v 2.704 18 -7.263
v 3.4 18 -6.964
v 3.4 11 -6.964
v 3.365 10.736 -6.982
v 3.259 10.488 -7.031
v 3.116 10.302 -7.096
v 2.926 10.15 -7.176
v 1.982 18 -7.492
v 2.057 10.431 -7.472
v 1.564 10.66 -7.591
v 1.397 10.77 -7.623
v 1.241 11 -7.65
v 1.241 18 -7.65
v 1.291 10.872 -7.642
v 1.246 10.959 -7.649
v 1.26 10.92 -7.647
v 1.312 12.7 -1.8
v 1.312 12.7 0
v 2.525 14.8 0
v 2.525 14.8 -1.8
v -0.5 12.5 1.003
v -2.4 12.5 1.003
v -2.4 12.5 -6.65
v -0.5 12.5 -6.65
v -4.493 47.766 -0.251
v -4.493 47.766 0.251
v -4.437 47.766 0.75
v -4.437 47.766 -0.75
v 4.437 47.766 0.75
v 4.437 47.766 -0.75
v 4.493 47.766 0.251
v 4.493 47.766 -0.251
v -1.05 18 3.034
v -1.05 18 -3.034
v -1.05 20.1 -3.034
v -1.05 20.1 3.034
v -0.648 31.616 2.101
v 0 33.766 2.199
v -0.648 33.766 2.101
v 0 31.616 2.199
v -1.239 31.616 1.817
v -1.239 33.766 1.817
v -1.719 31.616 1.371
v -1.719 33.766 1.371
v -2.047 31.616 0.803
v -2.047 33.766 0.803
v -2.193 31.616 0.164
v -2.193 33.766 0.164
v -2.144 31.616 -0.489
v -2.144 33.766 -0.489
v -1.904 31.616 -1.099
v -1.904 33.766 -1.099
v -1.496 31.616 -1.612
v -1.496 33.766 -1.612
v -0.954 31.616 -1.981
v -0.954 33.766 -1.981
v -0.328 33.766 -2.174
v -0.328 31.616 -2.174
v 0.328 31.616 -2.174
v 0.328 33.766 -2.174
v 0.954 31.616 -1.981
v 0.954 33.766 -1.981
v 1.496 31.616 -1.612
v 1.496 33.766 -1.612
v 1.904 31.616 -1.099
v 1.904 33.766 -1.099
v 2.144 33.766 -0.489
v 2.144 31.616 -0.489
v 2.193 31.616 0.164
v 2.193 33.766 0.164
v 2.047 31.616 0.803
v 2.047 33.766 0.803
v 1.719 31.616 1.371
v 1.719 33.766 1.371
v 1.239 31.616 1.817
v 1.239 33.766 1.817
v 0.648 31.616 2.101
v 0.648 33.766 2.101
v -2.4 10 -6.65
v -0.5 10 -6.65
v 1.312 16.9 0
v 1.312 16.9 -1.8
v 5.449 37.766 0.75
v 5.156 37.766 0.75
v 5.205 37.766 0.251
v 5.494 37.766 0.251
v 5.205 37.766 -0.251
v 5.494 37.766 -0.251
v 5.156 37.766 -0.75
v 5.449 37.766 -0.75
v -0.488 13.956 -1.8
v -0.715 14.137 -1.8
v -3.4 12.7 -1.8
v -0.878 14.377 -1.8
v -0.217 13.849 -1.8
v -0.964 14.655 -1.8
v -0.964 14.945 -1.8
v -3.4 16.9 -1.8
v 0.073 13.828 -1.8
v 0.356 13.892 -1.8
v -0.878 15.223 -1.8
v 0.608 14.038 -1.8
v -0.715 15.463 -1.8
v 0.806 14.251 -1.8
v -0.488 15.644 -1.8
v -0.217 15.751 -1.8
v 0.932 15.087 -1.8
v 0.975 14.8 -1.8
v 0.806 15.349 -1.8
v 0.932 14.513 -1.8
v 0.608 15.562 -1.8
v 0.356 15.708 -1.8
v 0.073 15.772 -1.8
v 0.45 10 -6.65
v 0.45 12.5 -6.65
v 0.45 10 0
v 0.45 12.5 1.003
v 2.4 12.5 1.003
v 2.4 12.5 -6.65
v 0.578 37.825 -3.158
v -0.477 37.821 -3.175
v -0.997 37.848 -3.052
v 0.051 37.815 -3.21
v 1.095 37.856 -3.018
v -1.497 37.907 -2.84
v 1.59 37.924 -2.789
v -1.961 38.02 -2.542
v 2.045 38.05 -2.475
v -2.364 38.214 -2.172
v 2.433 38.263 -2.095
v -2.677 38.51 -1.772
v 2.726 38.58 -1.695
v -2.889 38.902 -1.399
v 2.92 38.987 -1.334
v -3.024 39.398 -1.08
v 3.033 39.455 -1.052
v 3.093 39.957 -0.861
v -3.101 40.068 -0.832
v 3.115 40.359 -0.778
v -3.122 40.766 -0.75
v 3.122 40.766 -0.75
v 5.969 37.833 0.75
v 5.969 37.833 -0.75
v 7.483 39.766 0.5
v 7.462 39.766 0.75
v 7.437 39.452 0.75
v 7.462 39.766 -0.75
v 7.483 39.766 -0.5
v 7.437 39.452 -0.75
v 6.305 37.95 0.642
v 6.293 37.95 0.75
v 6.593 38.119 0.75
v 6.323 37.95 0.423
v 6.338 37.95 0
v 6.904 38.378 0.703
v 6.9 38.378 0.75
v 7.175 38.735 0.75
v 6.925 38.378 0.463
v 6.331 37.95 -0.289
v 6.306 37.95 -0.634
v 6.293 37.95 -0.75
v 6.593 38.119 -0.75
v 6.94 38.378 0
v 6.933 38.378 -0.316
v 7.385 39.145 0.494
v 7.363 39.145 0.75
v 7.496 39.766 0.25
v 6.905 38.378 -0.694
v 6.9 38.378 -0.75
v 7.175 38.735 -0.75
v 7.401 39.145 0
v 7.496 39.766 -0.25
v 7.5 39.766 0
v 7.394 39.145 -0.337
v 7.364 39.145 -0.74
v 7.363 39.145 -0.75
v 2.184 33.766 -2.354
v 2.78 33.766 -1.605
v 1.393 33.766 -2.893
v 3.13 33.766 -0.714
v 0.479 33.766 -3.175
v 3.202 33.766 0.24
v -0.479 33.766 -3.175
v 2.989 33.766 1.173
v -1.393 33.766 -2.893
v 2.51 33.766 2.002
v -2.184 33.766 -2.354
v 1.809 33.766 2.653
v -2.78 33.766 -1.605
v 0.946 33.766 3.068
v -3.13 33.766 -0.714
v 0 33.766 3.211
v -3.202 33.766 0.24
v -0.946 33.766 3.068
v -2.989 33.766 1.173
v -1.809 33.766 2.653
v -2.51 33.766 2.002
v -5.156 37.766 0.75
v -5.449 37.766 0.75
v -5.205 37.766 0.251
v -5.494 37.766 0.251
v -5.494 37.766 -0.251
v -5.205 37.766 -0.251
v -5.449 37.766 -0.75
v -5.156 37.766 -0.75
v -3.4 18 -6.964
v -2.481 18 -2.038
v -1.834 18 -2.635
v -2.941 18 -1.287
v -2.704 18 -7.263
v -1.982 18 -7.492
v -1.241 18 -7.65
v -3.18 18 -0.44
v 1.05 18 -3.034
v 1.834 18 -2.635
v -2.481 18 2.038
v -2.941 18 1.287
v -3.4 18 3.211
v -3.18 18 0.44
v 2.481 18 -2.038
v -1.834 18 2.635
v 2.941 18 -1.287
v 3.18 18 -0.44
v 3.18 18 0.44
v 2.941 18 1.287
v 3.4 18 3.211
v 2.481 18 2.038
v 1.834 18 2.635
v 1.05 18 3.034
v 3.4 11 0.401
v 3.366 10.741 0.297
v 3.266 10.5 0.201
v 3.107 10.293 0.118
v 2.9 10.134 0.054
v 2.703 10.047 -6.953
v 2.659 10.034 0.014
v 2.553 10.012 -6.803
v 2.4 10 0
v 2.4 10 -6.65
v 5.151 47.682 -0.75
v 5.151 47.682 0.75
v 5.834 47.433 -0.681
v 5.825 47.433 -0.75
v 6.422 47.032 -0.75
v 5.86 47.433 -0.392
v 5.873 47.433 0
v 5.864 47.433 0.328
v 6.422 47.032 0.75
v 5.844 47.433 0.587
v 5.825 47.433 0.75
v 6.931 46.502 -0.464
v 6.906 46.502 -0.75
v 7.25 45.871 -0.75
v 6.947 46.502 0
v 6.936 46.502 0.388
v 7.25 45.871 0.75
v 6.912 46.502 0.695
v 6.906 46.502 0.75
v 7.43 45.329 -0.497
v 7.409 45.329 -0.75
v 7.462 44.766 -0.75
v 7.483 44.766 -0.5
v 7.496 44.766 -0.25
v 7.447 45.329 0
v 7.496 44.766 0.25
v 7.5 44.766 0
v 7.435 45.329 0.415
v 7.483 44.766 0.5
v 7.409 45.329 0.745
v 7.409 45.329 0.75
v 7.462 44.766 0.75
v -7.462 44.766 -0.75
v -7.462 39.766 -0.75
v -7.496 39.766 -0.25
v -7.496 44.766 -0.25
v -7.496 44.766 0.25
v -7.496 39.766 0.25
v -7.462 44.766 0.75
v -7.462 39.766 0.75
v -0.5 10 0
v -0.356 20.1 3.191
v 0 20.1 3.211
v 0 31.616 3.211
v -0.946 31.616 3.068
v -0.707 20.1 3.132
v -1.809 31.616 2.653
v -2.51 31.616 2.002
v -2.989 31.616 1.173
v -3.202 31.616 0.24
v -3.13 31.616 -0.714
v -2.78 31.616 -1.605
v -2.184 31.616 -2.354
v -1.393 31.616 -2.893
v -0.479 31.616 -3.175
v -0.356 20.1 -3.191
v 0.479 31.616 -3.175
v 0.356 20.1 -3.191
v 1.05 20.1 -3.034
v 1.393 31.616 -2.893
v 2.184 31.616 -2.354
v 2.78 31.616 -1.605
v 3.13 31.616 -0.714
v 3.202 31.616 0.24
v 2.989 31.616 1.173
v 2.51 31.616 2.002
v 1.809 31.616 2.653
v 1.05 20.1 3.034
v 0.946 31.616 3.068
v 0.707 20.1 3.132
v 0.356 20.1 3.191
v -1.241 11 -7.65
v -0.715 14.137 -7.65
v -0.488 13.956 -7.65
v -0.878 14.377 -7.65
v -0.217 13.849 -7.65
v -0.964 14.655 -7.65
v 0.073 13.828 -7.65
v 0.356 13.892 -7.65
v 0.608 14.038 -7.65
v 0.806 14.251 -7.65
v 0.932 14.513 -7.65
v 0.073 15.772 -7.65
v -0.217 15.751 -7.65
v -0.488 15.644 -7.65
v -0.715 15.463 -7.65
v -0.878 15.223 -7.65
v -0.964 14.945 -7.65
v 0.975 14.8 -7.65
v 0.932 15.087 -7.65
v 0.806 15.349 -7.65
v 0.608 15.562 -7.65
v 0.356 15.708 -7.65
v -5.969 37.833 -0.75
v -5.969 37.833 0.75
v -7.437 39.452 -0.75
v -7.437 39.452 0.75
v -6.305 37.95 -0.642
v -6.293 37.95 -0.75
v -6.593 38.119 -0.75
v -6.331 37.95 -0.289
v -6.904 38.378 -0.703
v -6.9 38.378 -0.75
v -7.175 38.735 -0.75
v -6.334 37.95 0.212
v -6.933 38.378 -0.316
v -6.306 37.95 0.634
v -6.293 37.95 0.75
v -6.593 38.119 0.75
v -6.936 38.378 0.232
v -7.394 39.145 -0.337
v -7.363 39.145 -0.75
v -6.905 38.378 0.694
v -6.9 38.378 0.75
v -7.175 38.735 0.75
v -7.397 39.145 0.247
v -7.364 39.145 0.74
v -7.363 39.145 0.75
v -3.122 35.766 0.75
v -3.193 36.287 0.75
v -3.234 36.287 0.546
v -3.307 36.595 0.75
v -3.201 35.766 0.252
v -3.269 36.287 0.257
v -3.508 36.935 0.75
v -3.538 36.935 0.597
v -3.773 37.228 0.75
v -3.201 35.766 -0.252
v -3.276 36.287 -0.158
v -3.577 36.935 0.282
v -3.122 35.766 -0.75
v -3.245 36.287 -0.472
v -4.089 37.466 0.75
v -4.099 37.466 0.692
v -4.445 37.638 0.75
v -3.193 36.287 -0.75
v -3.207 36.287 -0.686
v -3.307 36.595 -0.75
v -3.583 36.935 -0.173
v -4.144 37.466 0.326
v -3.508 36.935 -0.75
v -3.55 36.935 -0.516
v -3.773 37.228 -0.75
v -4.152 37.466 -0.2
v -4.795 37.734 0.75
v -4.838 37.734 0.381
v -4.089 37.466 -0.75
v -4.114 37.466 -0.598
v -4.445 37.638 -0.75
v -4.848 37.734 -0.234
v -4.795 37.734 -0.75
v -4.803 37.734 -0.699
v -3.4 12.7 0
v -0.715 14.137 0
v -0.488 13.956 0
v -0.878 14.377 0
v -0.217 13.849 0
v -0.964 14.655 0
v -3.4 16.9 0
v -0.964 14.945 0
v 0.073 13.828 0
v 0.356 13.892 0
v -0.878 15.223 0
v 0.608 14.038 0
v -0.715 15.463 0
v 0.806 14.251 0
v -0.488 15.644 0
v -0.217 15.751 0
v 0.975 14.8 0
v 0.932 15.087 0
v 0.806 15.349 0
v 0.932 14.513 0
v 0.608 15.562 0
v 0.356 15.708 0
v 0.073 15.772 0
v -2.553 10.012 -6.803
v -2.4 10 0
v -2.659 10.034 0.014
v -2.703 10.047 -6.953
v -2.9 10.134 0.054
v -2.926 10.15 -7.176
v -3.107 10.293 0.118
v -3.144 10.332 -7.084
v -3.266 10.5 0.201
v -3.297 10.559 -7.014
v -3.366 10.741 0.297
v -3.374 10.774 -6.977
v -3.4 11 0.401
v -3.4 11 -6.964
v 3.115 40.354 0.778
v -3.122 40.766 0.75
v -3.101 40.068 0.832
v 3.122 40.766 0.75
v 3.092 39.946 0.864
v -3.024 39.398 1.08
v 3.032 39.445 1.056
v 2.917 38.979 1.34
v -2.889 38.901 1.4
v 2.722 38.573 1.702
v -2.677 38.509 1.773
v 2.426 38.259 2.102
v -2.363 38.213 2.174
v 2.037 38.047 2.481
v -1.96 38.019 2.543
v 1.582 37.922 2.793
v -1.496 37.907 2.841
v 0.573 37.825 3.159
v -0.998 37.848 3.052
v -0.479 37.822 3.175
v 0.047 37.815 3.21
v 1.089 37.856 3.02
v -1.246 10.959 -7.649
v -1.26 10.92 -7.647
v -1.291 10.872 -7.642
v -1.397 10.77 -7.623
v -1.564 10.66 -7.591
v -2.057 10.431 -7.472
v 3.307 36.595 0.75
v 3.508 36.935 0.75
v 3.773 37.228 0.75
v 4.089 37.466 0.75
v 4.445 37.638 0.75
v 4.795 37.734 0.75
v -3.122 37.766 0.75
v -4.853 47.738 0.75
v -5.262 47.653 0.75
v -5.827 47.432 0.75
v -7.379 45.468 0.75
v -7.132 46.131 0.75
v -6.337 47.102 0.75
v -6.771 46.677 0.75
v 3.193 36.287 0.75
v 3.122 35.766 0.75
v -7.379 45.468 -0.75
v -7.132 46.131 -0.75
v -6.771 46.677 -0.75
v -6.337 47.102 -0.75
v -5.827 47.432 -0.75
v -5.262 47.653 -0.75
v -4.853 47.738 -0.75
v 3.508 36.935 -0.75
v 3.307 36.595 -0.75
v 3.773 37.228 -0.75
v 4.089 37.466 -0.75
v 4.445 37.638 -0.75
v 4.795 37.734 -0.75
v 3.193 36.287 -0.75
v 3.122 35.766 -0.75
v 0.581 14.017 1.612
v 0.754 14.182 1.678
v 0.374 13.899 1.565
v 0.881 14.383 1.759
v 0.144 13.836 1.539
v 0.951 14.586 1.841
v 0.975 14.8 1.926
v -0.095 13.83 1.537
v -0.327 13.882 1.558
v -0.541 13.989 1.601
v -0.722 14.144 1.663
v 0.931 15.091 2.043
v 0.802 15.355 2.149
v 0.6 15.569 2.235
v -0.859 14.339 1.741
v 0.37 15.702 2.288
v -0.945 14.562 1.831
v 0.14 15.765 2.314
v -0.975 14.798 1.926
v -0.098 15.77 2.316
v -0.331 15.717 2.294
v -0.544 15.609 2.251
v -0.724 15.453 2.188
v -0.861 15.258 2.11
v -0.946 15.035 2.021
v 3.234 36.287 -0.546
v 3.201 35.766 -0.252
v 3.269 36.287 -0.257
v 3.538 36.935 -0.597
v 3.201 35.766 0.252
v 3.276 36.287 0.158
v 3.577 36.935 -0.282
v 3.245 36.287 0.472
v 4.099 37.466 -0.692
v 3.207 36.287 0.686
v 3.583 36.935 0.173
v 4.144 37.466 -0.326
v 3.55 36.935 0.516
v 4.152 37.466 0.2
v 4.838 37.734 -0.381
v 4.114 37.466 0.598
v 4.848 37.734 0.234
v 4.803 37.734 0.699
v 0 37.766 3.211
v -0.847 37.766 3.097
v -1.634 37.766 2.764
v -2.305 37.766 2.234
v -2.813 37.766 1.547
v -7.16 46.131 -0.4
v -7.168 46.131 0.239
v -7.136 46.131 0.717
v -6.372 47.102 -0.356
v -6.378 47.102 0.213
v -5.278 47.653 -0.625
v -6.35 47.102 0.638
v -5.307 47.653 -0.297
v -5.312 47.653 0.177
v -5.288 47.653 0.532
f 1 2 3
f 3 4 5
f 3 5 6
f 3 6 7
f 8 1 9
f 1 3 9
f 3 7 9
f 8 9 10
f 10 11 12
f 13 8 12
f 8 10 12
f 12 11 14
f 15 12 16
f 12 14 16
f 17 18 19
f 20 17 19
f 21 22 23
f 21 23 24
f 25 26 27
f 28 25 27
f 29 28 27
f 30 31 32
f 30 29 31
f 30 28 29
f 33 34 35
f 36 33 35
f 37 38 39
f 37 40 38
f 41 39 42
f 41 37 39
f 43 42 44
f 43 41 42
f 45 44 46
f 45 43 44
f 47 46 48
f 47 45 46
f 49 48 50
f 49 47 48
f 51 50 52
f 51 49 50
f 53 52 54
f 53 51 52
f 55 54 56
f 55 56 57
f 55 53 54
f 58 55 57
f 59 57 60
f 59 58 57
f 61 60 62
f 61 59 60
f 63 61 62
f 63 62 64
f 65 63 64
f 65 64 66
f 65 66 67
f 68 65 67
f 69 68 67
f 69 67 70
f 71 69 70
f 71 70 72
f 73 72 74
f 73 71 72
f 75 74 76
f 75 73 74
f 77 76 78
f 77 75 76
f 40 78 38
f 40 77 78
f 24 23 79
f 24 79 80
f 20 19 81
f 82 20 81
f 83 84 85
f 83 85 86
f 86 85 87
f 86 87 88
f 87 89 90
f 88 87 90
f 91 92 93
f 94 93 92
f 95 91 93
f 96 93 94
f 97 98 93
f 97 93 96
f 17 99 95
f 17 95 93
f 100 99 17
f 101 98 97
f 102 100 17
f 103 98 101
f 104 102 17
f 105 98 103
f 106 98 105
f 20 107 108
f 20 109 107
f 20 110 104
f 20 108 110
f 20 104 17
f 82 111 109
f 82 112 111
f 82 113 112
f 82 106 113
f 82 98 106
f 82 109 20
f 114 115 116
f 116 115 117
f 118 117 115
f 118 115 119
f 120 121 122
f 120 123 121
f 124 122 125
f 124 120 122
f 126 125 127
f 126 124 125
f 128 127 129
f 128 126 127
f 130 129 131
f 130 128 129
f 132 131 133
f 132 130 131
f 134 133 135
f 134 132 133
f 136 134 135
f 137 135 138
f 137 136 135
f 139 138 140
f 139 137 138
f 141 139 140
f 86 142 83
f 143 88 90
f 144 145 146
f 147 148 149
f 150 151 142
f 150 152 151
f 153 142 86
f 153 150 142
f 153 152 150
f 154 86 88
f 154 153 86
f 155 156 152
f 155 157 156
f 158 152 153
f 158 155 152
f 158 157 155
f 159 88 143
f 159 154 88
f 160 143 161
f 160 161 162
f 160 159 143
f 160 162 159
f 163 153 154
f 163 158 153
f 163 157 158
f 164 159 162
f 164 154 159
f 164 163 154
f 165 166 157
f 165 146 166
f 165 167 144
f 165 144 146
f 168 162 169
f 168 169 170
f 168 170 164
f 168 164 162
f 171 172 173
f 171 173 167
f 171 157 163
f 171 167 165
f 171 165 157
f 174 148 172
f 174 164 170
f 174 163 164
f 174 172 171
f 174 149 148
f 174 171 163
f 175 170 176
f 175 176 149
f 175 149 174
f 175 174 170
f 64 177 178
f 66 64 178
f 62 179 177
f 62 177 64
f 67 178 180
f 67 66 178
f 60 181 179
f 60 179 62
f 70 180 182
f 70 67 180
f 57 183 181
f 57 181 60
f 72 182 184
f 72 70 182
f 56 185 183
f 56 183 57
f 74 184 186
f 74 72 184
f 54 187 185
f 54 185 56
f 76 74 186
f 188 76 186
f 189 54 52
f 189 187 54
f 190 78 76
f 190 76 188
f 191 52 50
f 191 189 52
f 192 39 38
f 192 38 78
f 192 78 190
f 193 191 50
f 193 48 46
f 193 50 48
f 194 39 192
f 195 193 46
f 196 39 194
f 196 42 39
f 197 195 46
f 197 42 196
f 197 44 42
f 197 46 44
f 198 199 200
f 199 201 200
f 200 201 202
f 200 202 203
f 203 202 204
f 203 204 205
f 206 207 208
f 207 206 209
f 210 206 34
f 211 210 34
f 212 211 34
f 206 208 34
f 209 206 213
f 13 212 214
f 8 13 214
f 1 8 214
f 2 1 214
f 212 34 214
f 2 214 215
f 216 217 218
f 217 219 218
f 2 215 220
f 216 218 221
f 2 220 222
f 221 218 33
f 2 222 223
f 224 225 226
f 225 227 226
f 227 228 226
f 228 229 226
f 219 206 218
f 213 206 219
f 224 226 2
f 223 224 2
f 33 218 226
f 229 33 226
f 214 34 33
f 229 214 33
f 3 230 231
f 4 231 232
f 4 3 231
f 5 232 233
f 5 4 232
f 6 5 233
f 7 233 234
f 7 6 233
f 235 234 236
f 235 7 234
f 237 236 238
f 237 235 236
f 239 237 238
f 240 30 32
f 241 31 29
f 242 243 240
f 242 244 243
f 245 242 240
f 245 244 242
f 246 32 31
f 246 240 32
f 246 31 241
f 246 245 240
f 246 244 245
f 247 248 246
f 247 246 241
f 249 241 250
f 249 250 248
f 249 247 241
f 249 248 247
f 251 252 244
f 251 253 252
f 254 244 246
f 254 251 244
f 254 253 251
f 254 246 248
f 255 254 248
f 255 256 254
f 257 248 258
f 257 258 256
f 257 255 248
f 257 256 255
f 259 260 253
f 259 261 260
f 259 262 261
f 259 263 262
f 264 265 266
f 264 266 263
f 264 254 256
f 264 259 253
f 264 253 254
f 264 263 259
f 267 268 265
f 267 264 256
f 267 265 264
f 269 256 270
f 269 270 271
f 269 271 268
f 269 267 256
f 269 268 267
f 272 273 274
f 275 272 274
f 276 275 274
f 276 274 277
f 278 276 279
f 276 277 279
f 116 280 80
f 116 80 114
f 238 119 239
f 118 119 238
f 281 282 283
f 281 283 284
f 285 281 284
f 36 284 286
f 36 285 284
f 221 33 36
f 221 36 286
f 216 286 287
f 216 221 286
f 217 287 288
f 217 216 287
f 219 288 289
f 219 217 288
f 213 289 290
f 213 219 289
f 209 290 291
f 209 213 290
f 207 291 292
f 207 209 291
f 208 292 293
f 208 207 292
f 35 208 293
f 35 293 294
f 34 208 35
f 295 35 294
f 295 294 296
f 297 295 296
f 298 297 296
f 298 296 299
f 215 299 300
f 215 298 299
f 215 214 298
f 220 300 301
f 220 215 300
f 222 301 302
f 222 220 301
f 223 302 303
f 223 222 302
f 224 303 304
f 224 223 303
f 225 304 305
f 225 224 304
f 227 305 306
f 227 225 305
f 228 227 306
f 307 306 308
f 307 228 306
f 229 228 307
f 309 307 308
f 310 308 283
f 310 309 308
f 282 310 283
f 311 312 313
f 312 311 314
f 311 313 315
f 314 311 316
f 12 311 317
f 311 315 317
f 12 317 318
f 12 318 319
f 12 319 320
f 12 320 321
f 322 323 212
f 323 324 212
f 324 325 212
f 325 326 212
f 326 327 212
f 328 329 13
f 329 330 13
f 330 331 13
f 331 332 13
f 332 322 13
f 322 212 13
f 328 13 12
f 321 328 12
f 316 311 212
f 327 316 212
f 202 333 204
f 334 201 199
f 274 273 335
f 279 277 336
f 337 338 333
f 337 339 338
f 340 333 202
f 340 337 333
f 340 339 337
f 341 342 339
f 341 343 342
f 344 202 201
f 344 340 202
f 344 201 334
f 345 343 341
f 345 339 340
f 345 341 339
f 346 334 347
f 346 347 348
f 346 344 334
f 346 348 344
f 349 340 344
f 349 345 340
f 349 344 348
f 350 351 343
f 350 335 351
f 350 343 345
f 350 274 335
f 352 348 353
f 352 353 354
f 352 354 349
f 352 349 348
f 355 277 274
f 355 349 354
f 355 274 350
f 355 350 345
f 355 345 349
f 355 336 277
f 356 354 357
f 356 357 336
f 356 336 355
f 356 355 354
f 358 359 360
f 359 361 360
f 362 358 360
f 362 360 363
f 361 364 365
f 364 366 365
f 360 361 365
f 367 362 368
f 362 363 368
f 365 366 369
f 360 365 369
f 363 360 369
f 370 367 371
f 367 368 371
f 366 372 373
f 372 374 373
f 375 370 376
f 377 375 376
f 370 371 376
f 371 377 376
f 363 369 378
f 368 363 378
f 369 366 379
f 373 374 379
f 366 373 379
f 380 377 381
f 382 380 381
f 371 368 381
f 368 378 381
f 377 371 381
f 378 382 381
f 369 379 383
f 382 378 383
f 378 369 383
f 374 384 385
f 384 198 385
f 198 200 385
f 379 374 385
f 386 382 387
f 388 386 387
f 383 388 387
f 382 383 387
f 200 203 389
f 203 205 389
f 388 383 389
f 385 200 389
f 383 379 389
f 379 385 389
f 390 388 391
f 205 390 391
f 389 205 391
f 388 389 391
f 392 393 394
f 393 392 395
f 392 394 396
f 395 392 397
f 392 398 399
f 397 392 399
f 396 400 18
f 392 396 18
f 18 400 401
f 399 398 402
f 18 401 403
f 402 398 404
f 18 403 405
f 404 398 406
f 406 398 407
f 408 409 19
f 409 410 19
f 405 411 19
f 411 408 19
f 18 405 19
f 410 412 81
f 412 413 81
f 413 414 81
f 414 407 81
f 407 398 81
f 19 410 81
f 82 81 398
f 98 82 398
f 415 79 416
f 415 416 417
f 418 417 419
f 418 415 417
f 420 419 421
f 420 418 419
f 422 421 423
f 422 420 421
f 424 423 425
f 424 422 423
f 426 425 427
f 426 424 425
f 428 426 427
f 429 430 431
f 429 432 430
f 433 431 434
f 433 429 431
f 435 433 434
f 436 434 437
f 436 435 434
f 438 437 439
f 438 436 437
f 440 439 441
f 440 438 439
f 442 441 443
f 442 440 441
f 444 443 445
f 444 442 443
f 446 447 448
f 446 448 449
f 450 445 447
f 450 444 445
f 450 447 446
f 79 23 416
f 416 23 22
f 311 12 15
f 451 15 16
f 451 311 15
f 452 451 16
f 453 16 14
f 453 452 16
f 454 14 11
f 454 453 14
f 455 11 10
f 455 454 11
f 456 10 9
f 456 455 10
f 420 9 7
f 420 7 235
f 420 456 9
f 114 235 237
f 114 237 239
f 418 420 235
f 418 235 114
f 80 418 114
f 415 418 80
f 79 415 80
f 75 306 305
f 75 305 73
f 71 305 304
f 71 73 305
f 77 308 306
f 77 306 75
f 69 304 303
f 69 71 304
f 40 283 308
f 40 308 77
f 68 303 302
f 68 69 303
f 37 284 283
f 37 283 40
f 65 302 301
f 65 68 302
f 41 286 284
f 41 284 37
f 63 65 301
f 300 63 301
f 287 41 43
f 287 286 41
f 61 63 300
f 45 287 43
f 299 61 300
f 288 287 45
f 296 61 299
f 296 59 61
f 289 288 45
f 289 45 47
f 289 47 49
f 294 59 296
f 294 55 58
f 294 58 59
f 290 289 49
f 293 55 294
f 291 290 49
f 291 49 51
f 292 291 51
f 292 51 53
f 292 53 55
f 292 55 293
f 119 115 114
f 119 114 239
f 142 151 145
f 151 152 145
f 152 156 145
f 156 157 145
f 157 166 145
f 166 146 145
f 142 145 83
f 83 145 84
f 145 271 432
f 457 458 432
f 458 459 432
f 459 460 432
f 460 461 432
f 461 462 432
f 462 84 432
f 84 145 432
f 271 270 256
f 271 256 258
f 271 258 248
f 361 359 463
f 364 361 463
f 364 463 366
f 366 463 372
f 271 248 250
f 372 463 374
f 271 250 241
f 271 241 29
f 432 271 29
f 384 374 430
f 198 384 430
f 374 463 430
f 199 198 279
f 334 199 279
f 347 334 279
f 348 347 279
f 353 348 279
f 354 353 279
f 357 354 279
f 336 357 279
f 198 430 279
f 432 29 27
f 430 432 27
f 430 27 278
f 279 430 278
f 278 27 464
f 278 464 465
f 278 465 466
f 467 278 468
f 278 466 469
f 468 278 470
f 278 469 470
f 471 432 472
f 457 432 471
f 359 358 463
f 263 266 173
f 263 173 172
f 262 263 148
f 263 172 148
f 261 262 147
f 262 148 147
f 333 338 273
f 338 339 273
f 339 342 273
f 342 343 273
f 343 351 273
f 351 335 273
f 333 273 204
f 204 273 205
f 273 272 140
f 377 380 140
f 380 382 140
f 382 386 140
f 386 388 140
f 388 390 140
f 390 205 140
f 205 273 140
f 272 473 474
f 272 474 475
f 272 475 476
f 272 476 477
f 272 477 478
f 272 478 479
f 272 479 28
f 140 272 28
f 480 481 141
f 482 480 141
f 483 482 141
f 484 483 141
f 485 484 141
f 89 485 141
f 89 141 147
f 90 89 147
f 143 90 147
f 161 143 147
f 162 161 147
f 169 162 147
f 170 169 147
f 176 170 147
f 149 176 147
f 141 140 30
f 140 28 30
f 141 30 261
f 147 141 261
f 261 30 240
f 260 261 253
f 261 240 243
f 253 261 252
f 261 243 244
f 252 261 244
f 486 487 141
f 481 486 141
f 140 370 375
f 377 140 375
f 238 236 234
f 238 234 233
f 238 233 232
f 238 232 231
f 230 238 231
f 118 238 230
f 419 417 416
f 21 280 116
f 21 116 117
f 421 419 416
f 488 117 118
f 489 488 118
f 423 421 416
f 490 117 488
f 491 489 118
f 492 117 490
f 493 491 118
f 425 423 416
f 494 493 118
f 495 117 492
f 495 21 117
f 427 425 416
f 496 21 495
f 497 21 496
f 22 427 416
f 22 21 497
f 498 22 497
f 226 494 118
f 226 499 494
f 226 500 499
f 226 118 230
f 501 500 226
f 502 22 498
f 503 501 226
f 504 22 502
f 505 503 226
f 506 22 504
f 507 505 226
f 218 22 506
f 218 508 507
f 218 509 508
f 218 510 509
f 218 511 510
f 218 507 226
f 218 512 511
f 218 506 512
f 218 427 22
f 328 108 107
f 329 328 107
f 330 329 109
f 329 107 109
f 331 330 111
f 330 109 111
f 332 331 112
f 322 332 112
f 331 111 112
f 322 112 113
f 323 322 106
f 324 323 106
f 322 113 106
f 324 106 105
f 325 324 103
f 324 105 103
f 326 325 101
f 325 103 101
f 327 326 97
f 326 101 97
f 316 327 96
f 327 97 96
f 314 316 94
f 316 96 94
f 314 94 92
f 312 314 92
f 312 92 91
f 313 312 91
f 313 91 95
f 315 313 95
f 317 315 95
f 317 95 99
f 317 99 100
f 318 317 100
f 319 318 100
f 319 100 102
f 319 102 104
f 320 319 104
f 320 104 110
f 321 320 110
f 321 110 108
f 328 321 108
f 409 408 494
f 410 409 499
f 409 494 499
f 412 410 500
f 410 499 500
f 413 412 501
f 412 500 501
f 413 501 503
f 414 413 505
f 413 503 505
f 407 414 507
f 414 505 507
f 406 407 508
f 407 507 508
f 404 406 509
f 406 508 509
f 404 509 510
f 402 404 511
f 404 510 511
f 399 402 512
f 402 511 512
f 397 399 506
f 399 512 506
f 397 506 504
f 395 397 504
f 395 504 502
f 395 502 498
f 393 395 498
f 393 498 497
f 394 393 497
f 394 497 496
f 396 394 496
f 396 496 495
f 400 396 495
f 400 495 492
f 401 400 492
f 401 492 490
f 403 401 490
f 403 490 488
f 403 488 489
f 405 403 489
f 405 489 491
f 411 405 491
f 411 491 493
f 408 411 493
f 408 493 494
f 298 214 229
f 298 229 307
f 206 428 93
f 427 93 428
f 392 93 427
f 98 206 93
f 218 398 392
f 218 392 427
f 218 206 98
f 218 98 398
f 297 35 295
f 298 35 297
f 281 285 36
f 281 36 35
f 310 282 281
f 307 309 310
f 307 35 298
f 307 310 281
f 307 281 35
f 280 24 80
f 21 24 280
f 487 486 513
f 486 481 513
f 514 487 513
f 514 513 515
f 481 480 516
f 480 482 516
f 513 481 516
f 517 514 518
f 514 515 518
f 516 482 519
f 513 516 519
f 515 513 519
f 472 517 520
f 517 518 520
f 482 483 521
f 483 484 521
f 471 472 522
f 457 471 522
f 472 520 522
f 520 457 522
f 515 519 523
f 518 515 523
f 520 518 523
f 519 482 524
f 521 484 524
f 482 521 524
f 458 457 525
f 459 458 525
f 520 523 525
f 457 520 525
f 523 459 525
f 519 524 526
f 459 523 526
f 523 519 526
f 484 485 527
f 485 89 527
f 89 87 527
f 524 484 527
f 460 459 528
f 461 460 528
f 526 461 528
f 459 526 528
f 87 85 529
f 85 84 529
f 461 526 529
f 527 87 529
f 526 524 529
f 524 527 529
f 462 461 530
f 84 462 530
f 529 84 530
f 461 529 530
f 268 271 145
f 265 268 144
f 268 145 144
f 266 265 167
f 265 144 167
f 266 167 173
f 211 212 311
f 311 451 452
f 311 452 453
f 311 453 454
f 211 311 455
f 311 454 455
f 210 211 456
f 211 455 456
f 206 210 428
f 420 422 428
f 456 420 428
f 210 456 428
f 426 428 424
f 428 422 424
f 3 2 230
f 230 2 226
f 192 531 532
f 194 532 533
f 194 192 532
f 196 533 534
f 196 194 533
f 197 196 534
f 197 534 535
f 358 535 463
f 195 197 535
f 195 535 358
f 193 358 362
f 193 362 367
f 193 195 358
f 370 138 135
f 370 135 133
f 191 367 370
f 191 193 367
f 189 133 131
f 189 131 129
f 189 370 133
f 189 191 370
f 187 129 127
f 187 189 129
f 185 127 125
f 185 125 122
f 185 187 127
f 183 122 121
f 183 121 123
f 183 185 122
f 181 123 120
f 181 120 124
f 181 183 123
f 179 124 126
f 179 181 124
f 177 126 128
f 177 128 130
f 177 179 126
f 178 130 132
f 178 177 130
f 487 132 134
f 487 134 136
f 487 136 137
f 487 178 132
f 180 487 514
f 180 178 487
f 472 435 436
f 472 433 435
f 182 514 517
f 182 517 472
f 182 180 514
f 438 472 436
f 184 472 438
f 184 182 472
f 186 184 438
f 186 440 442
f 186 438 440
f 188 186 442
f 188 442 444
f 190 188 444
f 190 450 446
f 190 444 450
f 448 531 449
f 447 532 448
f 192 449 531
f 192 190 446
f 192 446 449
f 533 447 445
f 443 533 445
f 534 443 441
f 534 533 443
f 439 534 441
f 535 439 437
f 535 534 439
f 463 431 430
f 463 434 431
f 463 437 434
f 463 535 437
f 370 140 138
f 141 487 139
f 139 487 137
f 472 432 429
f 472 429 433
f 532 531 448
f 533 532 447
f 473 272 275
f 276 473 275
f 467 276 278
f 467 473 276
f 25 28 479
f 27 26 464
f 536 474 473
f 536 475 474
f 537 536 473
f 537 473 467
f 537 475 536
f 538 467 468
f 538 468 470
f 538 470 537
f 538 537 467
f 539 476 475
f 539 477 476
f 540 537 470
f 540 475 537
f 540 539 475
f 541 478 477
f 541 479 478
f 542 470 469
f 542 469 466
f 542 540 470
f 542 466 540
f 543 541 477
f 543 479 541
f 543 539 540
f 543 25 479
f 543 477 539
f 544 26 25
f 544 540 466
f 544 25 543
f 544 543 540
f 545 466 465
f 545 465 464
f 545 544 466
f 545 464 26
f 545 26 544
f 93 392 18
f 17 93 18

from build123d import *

# Parameters (mm, degrees)
BOSS_EXTRUDE1_DEPTH = 10
FILLET2_R           = 2
FILLET3_R           = 3
BOSS_EXTRUDE3_START = 5.5
SKETCH5_W           = 6.8
SKETCH5_H           = 15.3
SKETCH5_W_2         = 1.95
SKETCH5_H_2         = 13.3
SKETCH5_W_3         = 1.9
BOSS_EXTRUDE3_DEPTH = 2.5
SKETCH7_W           = 6.8
SKETCH7_H           = 15.3
BOSS_EXTRUDE4_DEPTH = 5.5
FILLET7_START       = -3.4
FILLET7_DEPTH       = 6.8
FILLET7_START_2     = -9
FILLET7_2_DEPTH     = 18
SKETCH8_R           = 0.975
CUT_EXTRUDE2_DEPTH  = 51.714038513
CUT_EXTRUDE4_DEPTH  = 50.587359306
CUT_EXTRUDE5_DEPTH  = 1.8
SKETCH14_R          = 1.95
CUT_EXTRUDE6_DEPTH  = 3.5
SKETCH17_W          = 2.1
SKETCH17_H          = 2.1
CUT_EXTRUDE8_DEPTH  = 51.714038513
BOSS_EXTRUDE5_START = -15.3
SKETCH18_W          = 1.9
SKETCH18_H          = 2
BOSS_EXTRUDE5_DEPTH = 15.3
SKETCH19_W          = 1.9
SKETCH19_H          = 0.1
CUT_EXTRUDE9_DEPTH  = 10.87055
SKETCH20_R          = 1.9
SKETCH20_R_2        = 1.075
BOSS_EXTRUDE6_DEPTH = 1.5
SKETCH21_R          = 12.317587445
SKETCH21_R_2        = 7.75
CUT_EXTRUDE10_DEPTH = 49.952489235


with BuildPart() as part:
    # Sketch1 → Revolve1 (revolve)
    with BuildSketch(Plane.XY, mode=Mode.PRIVATE) as revolve1_sk:
        Polygon((3.210554255, 37.765821371), (3.210554255, 33.765821371), (2.198784107, 33.765821371), (2.198784107, 31.615821371), (3.210554255, 31.615821371), (3.210554255, 18), (0, 18), (0, 37.765821371), align=None)
    revolve(revolve1_sk.sketch.rotate(Axis((0, 37.765821371, 0), (0, -1, 0)), 90), axis=Axis((0, 37.765821371, 0), (0, -1, 0)))

    # Sketch2 → Boss-Extrude1 (add)
    with BuildSketch(Plane(origin=(0, 37.765821371, 0), x_dir=(1, 0, 0), z_dir=(0, 1, 0))):
        with BuildLine():
            Line((3.121723662, 0.75), (-3.121723662, 0.75))
            ThreePointArc((-3.121723662, 0.75), (-3.210554255, 0), (-3.121723662, -0.75))
            Line((-3.121723662, -0.75), (3.121723662, -0.75))
            ThreePointArc((3.121723662, -0.75), (3.188269265, -0.377621131), (3.210554255, 0))
            ThreePointArc((3.210554255, 0), (3.188269265, 0.377621131), (3.121723662, 0.75))
        make_face()
        with BuildLine():
            Line((-3.121723662, 0.75), (-7.462405778, 0.75))
            ThreePointArc((-7.462405778, 0.75), (-7.5, 0), (-7.462405778, -0.75))
            Line((-7.462405778, -0.75), (-3.121723662, -0.75))
            ThreePointArc((-3.121723662, -0.75), (-3.210554255, 0), (-3.121723662, 0.75))
        make_face()
        with BuildLine():
            ThreePointArc((7.5, 0), (7.490595548, 0.375470813), (7.462405778, 0.75))
            Line((7.462405778, 0.75), (3.121723662, 0.75))
            ThreePointArc((3.121723662, 0.75), (3.188269265, 0.377621131), (3.210554255, 0))
            ThreePointArc((3.210554255, 0), (3.188269265, -0.377621131), (3.121723662, -0.75))
            Line((3.121723662, -0.75), (7.462405778, -0.75))
            ThreePointArc((7.462405778, -0.75), (7.490595548, -0.375470813), (7.5, 0))
        make_face()
    extrude(amount=BOSS_EXTRUDE1_DEPTH)

    # Fillet2
    # the kernel refuses this fillet: 2 mm, written as the material it adds along each edge
    with BuildSketch(Plane(origin=(0, 37.765821371, 0), x_dir=(0.2205776552735497, 0, 0.9753694161670351), z_dir=(0.9753694161670351, 0, -0.2205776552735497))) as fillet2_piece_1_section:
        with BuildLine():
            CenterArc((3.210554255 + FILLET2_R, FILLET2_R), FILLET2_R, 180, 90)
            Line((3.210554255 + FILLET2_R, 0), (3.210554255, 0))
            Line((3.210554255, 0), (3.210554255, FILLET2_R))
        make_face()
    fillet2_piece_1 = revolve(axis=Axis((0, 37.765821371, 0), (0, -1, 0)), revolution_arc=205.485927446, mode=Mode.PRIVATE)
    fillet2_piece_1 = split(fillet2_piece_1, bisect_by=Plane(origin=(0, 37.765821371, 0.75), z_dir=(0, 0, -1)), keep=Keep.TOP, mode=Mode.PRIVATE)
    fillet2_piece_1 = split(fillet2_piece_1, bisect_by=Plane(origin=(0, 37.765821371, -0.75), z_dir=(0, 0, 1)), keep=Keep.TOP, mode=Mode.PRIVATE)
    add(fillet2_piece_1)
    with BuildSketch(Plane(origin=(0, 37.765821371, 0), x_dir=(-0.22057765527352385, 0, -0.9753694161670411), z_dir=(-0.9753694161670411, 0, 0.22057765527352385))) as fillet2_piece_2_section:
        with BuildLine():
            CenterArc((3.210554255 + FILLET2_R, FILLET2_R), FILLET2_R, 180, 90)
            Line((3.210554255 + FILLET2_R, 0), (3.210554255, 0))
            Line((3.210554255, 0), (3.210554255, FILLET2_R))
        make_face()
    fillet2_piece_2 = revolve(axis=Axis((0, 37.765821371, 0), (0, -1, 0)), revolution_arc=205.485927446, mode=Mode.PRIVATE)
    fillet2_piece_2 = split(fillet2_piece_2, bisect_by=Plane(origin=(0, 37.765821371, 0.75), z_dir=(0, 0, -1)), keep=Keep.TOP, mode=Mode.PRIVATE)
    fillet2_piece_2 = split(fillet2_piece_2, bisect_by=Plane(origin=(0, 37.765821371, -0.75), z_dir=(0, 0, 1)), keep=Keep.TOP, mode=Mode.PRIVATE)
    add(fillet2_piece_2)
    # the kernel refuses this fillet: 2 mm, written as the material it takes off along each edge
    with BuildSketch(Plane(origin=(0, 37.765821371, 0), x_dir=(-0.7201079494948177, 0, -0.6938620475817721), z_dir=(0.6938620475817721, 0, -0.7201079494948177))) as fillet2_2_piece_1:
        with BuildLine():
            CenterArc((7.5 - FILLET2_R, FILLET2_R), FILLET2_R, 270, 90)
            Line((7.5, FILLET2_R), (7.5, 0))
            Line((7.5, 0), (7.5 - FILLET2_R, 0))
        make_face()
    revolve(axis=Axis((0, 37.765821371, 0), (0, 1, 0)), revolution_arc=87.873212667, mode=Mode.SUBTRACT)
    with BuildSketch(Plane(origin=(0, 37.765821371, 0), x_dir=(0.7201079494948216, 0, 0.6938620475817678), z_dir=(-0.6938620475817678, 0, 0.7201079494948216))) as fillet2_2_piece_2:
        with BuildLine():
            CenterArc((7.5 - FILLET2_R, FILLET2_R), FILLET2_R, 270, 90)
            Line((7.5, FILLET2_R), (7.5, 0))
            Line((7.5, 0), (7.5 - FILLET2_R, 0))
        make_face()
    revolve(axis=Axis((0, 37.765821371, 0), (0, 1, 0)), revolution_arc=87.873212667, mode=Mode.SUBTRACT)

    # Fillet3
    # the kernel refuses this fillet: 3 mm, written as the material it adds along each edge
    with BuildSketch(Plane(origin=(10.621723662, 37.765821371, -0.75), x_dir=(0, 1, 0), z_dir=(-1, 0, 0))) as fillet3_piece_1_section:
        with BuildLine():
            CenterArc((FILLET3_R, FILLET3_R), FILLET3_R, 180, 90)
            Line((0, FILLET3_R), (0, 0))
            Line((0, 0), (FILLET3_R, 0))
        make_face()
    fillet3_piece_1 = extrude(amount=21.243447325, mode=Mode.PRIVATE)
    fillet3_piece_1 = fillet3_piece_1 & Plane(origin=(0, 37.765821371, 0), x_dir=(0, 0, 1), z_dir=(0, -1, 0)) * Cylinder(3.210554255, 55, mode=Mode.PRIVATE)
    add(fillet3_piece_1)
    with BuildSketch(Plane(origin=(10.621723662, 37.765821371, 0.75), x_dir=(0, 1, 0), z_dir=(-1, 0, 0))) as fillet3_piece_2_section:
        with BuildLine():
            CenterArc((FILLET3_R, -FILLET3_R), FILLET3_R, 90, 90)
            Line((0, -FILLET3_R), (0, 0))
            Line((0, 0), (FILLET3_R, 0))
        make_face()
    fillet3_piece_2 = extrude(amount=21.243447325, mode=Mode.PRIVATE)
    fillet3_piece_2 = fillet3_piece_2 & Plane(origin=(0, 37.765821371, 0), x_dir=(0, 0, 1), z_dir=(0, -1, 0)) * Cylinder(3.210554255, 55, mode=Mode.PRIVATE)
    add(fillet3_piece_2)
    # the kernel refuses this fillet: 3 mm, written as the material it takes off along each edge
    with BuildSketch(Plane(origin=(0, 47.765821371, 0), x_dir=(-0.45344108598997085, 0, -0.891286251176487), z_dir=(0.891286251176487, 0, -0.45344108598997085))) as fillet3_2_piece_1:
        with BuildLine():
            CenterArc((7.5 - FILLET3_R, -FILLET3_R), FILLET3_R, 360, 90)
            Line((7.5 - FILLET3_R, 0), (7.5, 0))
            Line((7.5, 0), (7.5, -FILLET3_R))
        make_face()
    revolve(axis=Axis((0, 47.765821371, 0), (0, 1, 0)), revolution_arc=126.070648523, mode=Mode.SUBTRACT)
    with BuildSketch(Plane(origin=(0, 47.765821371, 0), x_dir=(0.4534410859901425, 0, -0.8912862511763997), z_dir=(-0.8912862511763997, 0, -0.4534410859901425))) as fillet3_2_piece_2:
        with BuildLine():
            CenterArc((7.5 - FILLET3_R, FILLET3_R), FILLET3_R, 270, 90)
            Line((7.5, FILLET3_R), (7.5, 0))
            Line((7.5, 0), (7.5 - FILLET3_R, 0))
        make_face()
    revolve(axis=Axis((0, 47.765821371, 0), (0, -1, 0)), revolution_arc=126.070648523, mode=Mode.SUBTRACT)



with BuildPart() as body_2:
    # Sketch5 → Boss-Extrude3 (new body)
    with BuildSketch(Plane.XZ.offset(-18).offset(BOSS_EXTRUDE3_START)):
        Rectangle(SKETCH5_W, SKETCH5_H)
        with Locations((1.425, 0)):
            Rectangle(SKETCH5_W_2, SKETCH5_H_2, mode=Mode.SUBTRACT)
        with Locations((-1.45, 0)):
            Rectangle(SKETCH5_W_3, SKETCH5_H_2, mode=Mode.SUBTRACT)
    extrude(amount=BOSS_EXTRUDE3_DEPTH)


with BuildPart() as part_1:
    add(part.part)

    add(body_2.part)  # Boss-Extrude4 merges body 2
    # Sketch7 → Boss-Extrude4 (add)
    with BuildSketch(Plane.XZ.offset(-18)):
        Rectangle(SKETCH7_W, SKETCH7_H)
    extrude(amount=BOSS_EXTRUDE4_DEPTH)

    # Fillet7: read off the stored shape, not the designer's step
    # Fillet7 outline → Fillet7 (cut)
    with BuildSketch(Plane.YZ.offset(FILLET7_START)):
        with BuildLine():
            Line((10, 7.65), (10, 6.65))
            ThreePointArc((10, 6.65), (10.292893219, 7.357106781), (11, 7.65))
            Line((11, 7.65), (10, 7.65))
        make_face()
        with BuildLine():
            ThreePointArc((11, -7.65), (10.292893219, -7.357106781), (10, -6.65))
            Line((10, -6.65), (10, -7.65))
            Line((10, -7.65), (11, -7.65))
        make_face()
    extrude(amount=FILLET7_DEPTH, mode=Mode.SUBTRACT)

    # Fillet7 2 outline → Fillet7 2 (cut)
    with BuildSketch(Plane.XY.offset(FILLET7_START_2)):
        with BuildLine():
            Line((-3.4, 10), (-2.4, 10))
            ThreePointArc((-2.4, 10), (-3.107106781, 10.292893219), (-3.4, 11))
            Line((-3.4, 11), (-3.4, 10))
        make_face()
        with BuildLine():
            Line((3.4, 10), (3.4, 11))
            ThreePointArc((3.4, 11), (3.107106781, 10.292893219), (2.4, 10))
            Line((2.4, 10), (3.4, 10))
        make_face()
    extrude(amount=FILLET7_2_DEPTH, mode=Mode.SUBTRACT)

    # Sketch8 → Cut-Extrude2 (cut, through all)
    with BuildSketch(Plane.XY.offset(7.65)):
        with Locations((0, 14.8)):
            Circle(SKETCH8_R)
    extrude(amount=-CUT_EXTRUDE2_DEPTH, mode=Mode.SUBTRACT)

    # Sketch11 → Cut-Extrude4 (cut, through all)
    with BuildSketch(Plane.ZY.offset(3.4)):
        Polygon((3.220554255, 18), (1, 10), (0, 10), (3.210554255, 18), align=None)
    extrude(amount=-CUT_EXTRUDE4_DEPTH, mode=Mode.SUBTRACT)


with BuildPart() as cut_extrude4_piece_1:
    # of the separate pieces the step leaves, piece 1, a body of its own (cut_extrude4_pieces)
    add(part_1.part.solids().sort_by_distance((3.4, 11, -7.65))[0])

    # Sketch13 → Cut-Extrude5 (cut)
    with BuildSketch(Plane.XY):
        with BuildLine():
            Line((-1.112435565, 12.7), (0, 12.7))
            ThreePointArc((0, 12.7), (2.1, 14.8), (0, 16.9))
            Line((0, 16.9), (-1.112435565, 16.9))
            Line((-1.112435565, 16.9), (-2.324871131, 14.8))
            Line((-2.324871131, 14.8), (-1.112435565, 12.7))
        make_face()
        with BuildLine():
            ThreePointArc((0, 16.9), (2.1, 14.8), (0, 12.7))
            Line((0, 12.7), (1.312435565, 12.7))
            Line((1.312435565, 12.7), (2.524871131, 14.8))
            Line((2.524871131, 14.8), (1.312435565, 16.9))
            Line((1.312435565, 16.9), (0, 16.9))
        make_face()
        with BuildLine():
            Line((-6.8, 12.7), (-1.112435565, 12.7))
            Line((-1.112435565, 12.7), (-2.324871131, 14.8))
            Line((-2.324871131, 14.8), (-1.112435565, 16.9))
            Line((-1.112435565, 16.9), (-6.8, 16.9))
            ThreePointArc((-6.8, 16.9), (-8.9, 14.8), (-6.8, 12.7))
        make_face()
    extrude(amount=-CUT_EXTRUDE5_DEPTH, mode=Mode.SUBTRACT)

    # Sketch17 → Cut-Extrude8 (cut, through all)
    with BuildSketch(Plane.XY.offset(7.65)):
        with Locations((0, 19.05)):
            Rectangle(SKETCH17_W, SKETCH17_H)
    extrude(amount=-CUT_EXTRUDE8_DEPTH, mode=Mode.SUBTRACT)


with BuildPart() as cut_extrude4_piece_2:
    # of the separate pieces the step leaves, piece 2, a body of its own (cut_extrude4_pieces)
    add(part_1.part.solids().sort_by_distance((3.4, 11, 7.65))[0])

    # Sketch14 → Cut-Extrude6 (cut)
    with BuildSketch(Plane.XY.offset(7.65)):
        with Locations((0, 14.8)):
            Circle(SKETCH14_R)
    extrude(amount=-CUT_EXTRUDE6_DEPTH, mode=Mode.SUBTRACT)

    # Sketch18 → Boss-Extrude5 (add)
    with BuildSketch(Plane.XY.offset(7.65).offset(BOSS_EXTRUDE5_START)):
        with Locations((0, 19)):
            Rectangle(SKETCH18_W, SKETCH18_H)
    extrude(amount=BOSS_EXTRUDE5_DEPTH)

    # Sketch19 → Cut-Extrude9 (cut)
    with BuildSketch(Plane(origin=(0, 0, -7.65), x_dir=(-1, 0, 0), z_dir=(0, 0, -1))):
        with Locations((0, 18.05)):
            Rectangle(SKETCH19_W, SKETCH19_H)
    extrude(amount=-CUT_EXTRUDE9_DEPTH, mode=Mode.SUBTRACT)


with BuildPart() as body_3:
    # Sketch20 → Boss-Extrude6 (new body)
    with BuildSketch(Plane.XY.offset(7.65)):
        with Locations((0, 14.8)):
            Circle(SKETCH20_R)
        with Locations((0, 14.8)):
            Circle(SKETCH20_R_2, mode=Mode.SUBTRACT)
    extrude(amount=-BOSS_EXTRUDE6_DEPTH)


with BuildPart() as cut_extrude10_tool:
    # Sketch21 → Cut-Extrude10 (new, through all)
    with BuildSketch(Plane(origin=(0, 0, 0), x_dir=(1, 0, 0), z_dir=(0, 1, 0))):
        Circle(SKETCH21_R)
        Circle(SKETCH21_R_2, mode=Mode.SUBTRACT)
    extrude(amount=CUT_EXTRUDE10_DEPTH)


with BuildPart() as cut_extrude4_piece_1_1:
    add(cut_extrude4_piece_1.part)

    # Cut-Extrude10: cut by cut_extrude10_tool
    add(cut_extrude10_tool.part, mode=Mode.SUBTRACT)


with BuildPart() as cut_extrude4_piece_2_1:
    add(cut_extrude4_piece_2.part)

    # Cut-Extrude10: cut by cut_extrude10_tool
    add(cut_extrude10_tool.part, mode=Mode.SUBTRACT)


with BuildPart() as body_3_1:
    add(body_3.part)

    # Cut-Extrude10: cut by cut_extrude10_tool
    add(cut_extrude10_tool.part, mode=Mode.SUBTRACT)


solid = cut_extrude4_piece_1_1.part
